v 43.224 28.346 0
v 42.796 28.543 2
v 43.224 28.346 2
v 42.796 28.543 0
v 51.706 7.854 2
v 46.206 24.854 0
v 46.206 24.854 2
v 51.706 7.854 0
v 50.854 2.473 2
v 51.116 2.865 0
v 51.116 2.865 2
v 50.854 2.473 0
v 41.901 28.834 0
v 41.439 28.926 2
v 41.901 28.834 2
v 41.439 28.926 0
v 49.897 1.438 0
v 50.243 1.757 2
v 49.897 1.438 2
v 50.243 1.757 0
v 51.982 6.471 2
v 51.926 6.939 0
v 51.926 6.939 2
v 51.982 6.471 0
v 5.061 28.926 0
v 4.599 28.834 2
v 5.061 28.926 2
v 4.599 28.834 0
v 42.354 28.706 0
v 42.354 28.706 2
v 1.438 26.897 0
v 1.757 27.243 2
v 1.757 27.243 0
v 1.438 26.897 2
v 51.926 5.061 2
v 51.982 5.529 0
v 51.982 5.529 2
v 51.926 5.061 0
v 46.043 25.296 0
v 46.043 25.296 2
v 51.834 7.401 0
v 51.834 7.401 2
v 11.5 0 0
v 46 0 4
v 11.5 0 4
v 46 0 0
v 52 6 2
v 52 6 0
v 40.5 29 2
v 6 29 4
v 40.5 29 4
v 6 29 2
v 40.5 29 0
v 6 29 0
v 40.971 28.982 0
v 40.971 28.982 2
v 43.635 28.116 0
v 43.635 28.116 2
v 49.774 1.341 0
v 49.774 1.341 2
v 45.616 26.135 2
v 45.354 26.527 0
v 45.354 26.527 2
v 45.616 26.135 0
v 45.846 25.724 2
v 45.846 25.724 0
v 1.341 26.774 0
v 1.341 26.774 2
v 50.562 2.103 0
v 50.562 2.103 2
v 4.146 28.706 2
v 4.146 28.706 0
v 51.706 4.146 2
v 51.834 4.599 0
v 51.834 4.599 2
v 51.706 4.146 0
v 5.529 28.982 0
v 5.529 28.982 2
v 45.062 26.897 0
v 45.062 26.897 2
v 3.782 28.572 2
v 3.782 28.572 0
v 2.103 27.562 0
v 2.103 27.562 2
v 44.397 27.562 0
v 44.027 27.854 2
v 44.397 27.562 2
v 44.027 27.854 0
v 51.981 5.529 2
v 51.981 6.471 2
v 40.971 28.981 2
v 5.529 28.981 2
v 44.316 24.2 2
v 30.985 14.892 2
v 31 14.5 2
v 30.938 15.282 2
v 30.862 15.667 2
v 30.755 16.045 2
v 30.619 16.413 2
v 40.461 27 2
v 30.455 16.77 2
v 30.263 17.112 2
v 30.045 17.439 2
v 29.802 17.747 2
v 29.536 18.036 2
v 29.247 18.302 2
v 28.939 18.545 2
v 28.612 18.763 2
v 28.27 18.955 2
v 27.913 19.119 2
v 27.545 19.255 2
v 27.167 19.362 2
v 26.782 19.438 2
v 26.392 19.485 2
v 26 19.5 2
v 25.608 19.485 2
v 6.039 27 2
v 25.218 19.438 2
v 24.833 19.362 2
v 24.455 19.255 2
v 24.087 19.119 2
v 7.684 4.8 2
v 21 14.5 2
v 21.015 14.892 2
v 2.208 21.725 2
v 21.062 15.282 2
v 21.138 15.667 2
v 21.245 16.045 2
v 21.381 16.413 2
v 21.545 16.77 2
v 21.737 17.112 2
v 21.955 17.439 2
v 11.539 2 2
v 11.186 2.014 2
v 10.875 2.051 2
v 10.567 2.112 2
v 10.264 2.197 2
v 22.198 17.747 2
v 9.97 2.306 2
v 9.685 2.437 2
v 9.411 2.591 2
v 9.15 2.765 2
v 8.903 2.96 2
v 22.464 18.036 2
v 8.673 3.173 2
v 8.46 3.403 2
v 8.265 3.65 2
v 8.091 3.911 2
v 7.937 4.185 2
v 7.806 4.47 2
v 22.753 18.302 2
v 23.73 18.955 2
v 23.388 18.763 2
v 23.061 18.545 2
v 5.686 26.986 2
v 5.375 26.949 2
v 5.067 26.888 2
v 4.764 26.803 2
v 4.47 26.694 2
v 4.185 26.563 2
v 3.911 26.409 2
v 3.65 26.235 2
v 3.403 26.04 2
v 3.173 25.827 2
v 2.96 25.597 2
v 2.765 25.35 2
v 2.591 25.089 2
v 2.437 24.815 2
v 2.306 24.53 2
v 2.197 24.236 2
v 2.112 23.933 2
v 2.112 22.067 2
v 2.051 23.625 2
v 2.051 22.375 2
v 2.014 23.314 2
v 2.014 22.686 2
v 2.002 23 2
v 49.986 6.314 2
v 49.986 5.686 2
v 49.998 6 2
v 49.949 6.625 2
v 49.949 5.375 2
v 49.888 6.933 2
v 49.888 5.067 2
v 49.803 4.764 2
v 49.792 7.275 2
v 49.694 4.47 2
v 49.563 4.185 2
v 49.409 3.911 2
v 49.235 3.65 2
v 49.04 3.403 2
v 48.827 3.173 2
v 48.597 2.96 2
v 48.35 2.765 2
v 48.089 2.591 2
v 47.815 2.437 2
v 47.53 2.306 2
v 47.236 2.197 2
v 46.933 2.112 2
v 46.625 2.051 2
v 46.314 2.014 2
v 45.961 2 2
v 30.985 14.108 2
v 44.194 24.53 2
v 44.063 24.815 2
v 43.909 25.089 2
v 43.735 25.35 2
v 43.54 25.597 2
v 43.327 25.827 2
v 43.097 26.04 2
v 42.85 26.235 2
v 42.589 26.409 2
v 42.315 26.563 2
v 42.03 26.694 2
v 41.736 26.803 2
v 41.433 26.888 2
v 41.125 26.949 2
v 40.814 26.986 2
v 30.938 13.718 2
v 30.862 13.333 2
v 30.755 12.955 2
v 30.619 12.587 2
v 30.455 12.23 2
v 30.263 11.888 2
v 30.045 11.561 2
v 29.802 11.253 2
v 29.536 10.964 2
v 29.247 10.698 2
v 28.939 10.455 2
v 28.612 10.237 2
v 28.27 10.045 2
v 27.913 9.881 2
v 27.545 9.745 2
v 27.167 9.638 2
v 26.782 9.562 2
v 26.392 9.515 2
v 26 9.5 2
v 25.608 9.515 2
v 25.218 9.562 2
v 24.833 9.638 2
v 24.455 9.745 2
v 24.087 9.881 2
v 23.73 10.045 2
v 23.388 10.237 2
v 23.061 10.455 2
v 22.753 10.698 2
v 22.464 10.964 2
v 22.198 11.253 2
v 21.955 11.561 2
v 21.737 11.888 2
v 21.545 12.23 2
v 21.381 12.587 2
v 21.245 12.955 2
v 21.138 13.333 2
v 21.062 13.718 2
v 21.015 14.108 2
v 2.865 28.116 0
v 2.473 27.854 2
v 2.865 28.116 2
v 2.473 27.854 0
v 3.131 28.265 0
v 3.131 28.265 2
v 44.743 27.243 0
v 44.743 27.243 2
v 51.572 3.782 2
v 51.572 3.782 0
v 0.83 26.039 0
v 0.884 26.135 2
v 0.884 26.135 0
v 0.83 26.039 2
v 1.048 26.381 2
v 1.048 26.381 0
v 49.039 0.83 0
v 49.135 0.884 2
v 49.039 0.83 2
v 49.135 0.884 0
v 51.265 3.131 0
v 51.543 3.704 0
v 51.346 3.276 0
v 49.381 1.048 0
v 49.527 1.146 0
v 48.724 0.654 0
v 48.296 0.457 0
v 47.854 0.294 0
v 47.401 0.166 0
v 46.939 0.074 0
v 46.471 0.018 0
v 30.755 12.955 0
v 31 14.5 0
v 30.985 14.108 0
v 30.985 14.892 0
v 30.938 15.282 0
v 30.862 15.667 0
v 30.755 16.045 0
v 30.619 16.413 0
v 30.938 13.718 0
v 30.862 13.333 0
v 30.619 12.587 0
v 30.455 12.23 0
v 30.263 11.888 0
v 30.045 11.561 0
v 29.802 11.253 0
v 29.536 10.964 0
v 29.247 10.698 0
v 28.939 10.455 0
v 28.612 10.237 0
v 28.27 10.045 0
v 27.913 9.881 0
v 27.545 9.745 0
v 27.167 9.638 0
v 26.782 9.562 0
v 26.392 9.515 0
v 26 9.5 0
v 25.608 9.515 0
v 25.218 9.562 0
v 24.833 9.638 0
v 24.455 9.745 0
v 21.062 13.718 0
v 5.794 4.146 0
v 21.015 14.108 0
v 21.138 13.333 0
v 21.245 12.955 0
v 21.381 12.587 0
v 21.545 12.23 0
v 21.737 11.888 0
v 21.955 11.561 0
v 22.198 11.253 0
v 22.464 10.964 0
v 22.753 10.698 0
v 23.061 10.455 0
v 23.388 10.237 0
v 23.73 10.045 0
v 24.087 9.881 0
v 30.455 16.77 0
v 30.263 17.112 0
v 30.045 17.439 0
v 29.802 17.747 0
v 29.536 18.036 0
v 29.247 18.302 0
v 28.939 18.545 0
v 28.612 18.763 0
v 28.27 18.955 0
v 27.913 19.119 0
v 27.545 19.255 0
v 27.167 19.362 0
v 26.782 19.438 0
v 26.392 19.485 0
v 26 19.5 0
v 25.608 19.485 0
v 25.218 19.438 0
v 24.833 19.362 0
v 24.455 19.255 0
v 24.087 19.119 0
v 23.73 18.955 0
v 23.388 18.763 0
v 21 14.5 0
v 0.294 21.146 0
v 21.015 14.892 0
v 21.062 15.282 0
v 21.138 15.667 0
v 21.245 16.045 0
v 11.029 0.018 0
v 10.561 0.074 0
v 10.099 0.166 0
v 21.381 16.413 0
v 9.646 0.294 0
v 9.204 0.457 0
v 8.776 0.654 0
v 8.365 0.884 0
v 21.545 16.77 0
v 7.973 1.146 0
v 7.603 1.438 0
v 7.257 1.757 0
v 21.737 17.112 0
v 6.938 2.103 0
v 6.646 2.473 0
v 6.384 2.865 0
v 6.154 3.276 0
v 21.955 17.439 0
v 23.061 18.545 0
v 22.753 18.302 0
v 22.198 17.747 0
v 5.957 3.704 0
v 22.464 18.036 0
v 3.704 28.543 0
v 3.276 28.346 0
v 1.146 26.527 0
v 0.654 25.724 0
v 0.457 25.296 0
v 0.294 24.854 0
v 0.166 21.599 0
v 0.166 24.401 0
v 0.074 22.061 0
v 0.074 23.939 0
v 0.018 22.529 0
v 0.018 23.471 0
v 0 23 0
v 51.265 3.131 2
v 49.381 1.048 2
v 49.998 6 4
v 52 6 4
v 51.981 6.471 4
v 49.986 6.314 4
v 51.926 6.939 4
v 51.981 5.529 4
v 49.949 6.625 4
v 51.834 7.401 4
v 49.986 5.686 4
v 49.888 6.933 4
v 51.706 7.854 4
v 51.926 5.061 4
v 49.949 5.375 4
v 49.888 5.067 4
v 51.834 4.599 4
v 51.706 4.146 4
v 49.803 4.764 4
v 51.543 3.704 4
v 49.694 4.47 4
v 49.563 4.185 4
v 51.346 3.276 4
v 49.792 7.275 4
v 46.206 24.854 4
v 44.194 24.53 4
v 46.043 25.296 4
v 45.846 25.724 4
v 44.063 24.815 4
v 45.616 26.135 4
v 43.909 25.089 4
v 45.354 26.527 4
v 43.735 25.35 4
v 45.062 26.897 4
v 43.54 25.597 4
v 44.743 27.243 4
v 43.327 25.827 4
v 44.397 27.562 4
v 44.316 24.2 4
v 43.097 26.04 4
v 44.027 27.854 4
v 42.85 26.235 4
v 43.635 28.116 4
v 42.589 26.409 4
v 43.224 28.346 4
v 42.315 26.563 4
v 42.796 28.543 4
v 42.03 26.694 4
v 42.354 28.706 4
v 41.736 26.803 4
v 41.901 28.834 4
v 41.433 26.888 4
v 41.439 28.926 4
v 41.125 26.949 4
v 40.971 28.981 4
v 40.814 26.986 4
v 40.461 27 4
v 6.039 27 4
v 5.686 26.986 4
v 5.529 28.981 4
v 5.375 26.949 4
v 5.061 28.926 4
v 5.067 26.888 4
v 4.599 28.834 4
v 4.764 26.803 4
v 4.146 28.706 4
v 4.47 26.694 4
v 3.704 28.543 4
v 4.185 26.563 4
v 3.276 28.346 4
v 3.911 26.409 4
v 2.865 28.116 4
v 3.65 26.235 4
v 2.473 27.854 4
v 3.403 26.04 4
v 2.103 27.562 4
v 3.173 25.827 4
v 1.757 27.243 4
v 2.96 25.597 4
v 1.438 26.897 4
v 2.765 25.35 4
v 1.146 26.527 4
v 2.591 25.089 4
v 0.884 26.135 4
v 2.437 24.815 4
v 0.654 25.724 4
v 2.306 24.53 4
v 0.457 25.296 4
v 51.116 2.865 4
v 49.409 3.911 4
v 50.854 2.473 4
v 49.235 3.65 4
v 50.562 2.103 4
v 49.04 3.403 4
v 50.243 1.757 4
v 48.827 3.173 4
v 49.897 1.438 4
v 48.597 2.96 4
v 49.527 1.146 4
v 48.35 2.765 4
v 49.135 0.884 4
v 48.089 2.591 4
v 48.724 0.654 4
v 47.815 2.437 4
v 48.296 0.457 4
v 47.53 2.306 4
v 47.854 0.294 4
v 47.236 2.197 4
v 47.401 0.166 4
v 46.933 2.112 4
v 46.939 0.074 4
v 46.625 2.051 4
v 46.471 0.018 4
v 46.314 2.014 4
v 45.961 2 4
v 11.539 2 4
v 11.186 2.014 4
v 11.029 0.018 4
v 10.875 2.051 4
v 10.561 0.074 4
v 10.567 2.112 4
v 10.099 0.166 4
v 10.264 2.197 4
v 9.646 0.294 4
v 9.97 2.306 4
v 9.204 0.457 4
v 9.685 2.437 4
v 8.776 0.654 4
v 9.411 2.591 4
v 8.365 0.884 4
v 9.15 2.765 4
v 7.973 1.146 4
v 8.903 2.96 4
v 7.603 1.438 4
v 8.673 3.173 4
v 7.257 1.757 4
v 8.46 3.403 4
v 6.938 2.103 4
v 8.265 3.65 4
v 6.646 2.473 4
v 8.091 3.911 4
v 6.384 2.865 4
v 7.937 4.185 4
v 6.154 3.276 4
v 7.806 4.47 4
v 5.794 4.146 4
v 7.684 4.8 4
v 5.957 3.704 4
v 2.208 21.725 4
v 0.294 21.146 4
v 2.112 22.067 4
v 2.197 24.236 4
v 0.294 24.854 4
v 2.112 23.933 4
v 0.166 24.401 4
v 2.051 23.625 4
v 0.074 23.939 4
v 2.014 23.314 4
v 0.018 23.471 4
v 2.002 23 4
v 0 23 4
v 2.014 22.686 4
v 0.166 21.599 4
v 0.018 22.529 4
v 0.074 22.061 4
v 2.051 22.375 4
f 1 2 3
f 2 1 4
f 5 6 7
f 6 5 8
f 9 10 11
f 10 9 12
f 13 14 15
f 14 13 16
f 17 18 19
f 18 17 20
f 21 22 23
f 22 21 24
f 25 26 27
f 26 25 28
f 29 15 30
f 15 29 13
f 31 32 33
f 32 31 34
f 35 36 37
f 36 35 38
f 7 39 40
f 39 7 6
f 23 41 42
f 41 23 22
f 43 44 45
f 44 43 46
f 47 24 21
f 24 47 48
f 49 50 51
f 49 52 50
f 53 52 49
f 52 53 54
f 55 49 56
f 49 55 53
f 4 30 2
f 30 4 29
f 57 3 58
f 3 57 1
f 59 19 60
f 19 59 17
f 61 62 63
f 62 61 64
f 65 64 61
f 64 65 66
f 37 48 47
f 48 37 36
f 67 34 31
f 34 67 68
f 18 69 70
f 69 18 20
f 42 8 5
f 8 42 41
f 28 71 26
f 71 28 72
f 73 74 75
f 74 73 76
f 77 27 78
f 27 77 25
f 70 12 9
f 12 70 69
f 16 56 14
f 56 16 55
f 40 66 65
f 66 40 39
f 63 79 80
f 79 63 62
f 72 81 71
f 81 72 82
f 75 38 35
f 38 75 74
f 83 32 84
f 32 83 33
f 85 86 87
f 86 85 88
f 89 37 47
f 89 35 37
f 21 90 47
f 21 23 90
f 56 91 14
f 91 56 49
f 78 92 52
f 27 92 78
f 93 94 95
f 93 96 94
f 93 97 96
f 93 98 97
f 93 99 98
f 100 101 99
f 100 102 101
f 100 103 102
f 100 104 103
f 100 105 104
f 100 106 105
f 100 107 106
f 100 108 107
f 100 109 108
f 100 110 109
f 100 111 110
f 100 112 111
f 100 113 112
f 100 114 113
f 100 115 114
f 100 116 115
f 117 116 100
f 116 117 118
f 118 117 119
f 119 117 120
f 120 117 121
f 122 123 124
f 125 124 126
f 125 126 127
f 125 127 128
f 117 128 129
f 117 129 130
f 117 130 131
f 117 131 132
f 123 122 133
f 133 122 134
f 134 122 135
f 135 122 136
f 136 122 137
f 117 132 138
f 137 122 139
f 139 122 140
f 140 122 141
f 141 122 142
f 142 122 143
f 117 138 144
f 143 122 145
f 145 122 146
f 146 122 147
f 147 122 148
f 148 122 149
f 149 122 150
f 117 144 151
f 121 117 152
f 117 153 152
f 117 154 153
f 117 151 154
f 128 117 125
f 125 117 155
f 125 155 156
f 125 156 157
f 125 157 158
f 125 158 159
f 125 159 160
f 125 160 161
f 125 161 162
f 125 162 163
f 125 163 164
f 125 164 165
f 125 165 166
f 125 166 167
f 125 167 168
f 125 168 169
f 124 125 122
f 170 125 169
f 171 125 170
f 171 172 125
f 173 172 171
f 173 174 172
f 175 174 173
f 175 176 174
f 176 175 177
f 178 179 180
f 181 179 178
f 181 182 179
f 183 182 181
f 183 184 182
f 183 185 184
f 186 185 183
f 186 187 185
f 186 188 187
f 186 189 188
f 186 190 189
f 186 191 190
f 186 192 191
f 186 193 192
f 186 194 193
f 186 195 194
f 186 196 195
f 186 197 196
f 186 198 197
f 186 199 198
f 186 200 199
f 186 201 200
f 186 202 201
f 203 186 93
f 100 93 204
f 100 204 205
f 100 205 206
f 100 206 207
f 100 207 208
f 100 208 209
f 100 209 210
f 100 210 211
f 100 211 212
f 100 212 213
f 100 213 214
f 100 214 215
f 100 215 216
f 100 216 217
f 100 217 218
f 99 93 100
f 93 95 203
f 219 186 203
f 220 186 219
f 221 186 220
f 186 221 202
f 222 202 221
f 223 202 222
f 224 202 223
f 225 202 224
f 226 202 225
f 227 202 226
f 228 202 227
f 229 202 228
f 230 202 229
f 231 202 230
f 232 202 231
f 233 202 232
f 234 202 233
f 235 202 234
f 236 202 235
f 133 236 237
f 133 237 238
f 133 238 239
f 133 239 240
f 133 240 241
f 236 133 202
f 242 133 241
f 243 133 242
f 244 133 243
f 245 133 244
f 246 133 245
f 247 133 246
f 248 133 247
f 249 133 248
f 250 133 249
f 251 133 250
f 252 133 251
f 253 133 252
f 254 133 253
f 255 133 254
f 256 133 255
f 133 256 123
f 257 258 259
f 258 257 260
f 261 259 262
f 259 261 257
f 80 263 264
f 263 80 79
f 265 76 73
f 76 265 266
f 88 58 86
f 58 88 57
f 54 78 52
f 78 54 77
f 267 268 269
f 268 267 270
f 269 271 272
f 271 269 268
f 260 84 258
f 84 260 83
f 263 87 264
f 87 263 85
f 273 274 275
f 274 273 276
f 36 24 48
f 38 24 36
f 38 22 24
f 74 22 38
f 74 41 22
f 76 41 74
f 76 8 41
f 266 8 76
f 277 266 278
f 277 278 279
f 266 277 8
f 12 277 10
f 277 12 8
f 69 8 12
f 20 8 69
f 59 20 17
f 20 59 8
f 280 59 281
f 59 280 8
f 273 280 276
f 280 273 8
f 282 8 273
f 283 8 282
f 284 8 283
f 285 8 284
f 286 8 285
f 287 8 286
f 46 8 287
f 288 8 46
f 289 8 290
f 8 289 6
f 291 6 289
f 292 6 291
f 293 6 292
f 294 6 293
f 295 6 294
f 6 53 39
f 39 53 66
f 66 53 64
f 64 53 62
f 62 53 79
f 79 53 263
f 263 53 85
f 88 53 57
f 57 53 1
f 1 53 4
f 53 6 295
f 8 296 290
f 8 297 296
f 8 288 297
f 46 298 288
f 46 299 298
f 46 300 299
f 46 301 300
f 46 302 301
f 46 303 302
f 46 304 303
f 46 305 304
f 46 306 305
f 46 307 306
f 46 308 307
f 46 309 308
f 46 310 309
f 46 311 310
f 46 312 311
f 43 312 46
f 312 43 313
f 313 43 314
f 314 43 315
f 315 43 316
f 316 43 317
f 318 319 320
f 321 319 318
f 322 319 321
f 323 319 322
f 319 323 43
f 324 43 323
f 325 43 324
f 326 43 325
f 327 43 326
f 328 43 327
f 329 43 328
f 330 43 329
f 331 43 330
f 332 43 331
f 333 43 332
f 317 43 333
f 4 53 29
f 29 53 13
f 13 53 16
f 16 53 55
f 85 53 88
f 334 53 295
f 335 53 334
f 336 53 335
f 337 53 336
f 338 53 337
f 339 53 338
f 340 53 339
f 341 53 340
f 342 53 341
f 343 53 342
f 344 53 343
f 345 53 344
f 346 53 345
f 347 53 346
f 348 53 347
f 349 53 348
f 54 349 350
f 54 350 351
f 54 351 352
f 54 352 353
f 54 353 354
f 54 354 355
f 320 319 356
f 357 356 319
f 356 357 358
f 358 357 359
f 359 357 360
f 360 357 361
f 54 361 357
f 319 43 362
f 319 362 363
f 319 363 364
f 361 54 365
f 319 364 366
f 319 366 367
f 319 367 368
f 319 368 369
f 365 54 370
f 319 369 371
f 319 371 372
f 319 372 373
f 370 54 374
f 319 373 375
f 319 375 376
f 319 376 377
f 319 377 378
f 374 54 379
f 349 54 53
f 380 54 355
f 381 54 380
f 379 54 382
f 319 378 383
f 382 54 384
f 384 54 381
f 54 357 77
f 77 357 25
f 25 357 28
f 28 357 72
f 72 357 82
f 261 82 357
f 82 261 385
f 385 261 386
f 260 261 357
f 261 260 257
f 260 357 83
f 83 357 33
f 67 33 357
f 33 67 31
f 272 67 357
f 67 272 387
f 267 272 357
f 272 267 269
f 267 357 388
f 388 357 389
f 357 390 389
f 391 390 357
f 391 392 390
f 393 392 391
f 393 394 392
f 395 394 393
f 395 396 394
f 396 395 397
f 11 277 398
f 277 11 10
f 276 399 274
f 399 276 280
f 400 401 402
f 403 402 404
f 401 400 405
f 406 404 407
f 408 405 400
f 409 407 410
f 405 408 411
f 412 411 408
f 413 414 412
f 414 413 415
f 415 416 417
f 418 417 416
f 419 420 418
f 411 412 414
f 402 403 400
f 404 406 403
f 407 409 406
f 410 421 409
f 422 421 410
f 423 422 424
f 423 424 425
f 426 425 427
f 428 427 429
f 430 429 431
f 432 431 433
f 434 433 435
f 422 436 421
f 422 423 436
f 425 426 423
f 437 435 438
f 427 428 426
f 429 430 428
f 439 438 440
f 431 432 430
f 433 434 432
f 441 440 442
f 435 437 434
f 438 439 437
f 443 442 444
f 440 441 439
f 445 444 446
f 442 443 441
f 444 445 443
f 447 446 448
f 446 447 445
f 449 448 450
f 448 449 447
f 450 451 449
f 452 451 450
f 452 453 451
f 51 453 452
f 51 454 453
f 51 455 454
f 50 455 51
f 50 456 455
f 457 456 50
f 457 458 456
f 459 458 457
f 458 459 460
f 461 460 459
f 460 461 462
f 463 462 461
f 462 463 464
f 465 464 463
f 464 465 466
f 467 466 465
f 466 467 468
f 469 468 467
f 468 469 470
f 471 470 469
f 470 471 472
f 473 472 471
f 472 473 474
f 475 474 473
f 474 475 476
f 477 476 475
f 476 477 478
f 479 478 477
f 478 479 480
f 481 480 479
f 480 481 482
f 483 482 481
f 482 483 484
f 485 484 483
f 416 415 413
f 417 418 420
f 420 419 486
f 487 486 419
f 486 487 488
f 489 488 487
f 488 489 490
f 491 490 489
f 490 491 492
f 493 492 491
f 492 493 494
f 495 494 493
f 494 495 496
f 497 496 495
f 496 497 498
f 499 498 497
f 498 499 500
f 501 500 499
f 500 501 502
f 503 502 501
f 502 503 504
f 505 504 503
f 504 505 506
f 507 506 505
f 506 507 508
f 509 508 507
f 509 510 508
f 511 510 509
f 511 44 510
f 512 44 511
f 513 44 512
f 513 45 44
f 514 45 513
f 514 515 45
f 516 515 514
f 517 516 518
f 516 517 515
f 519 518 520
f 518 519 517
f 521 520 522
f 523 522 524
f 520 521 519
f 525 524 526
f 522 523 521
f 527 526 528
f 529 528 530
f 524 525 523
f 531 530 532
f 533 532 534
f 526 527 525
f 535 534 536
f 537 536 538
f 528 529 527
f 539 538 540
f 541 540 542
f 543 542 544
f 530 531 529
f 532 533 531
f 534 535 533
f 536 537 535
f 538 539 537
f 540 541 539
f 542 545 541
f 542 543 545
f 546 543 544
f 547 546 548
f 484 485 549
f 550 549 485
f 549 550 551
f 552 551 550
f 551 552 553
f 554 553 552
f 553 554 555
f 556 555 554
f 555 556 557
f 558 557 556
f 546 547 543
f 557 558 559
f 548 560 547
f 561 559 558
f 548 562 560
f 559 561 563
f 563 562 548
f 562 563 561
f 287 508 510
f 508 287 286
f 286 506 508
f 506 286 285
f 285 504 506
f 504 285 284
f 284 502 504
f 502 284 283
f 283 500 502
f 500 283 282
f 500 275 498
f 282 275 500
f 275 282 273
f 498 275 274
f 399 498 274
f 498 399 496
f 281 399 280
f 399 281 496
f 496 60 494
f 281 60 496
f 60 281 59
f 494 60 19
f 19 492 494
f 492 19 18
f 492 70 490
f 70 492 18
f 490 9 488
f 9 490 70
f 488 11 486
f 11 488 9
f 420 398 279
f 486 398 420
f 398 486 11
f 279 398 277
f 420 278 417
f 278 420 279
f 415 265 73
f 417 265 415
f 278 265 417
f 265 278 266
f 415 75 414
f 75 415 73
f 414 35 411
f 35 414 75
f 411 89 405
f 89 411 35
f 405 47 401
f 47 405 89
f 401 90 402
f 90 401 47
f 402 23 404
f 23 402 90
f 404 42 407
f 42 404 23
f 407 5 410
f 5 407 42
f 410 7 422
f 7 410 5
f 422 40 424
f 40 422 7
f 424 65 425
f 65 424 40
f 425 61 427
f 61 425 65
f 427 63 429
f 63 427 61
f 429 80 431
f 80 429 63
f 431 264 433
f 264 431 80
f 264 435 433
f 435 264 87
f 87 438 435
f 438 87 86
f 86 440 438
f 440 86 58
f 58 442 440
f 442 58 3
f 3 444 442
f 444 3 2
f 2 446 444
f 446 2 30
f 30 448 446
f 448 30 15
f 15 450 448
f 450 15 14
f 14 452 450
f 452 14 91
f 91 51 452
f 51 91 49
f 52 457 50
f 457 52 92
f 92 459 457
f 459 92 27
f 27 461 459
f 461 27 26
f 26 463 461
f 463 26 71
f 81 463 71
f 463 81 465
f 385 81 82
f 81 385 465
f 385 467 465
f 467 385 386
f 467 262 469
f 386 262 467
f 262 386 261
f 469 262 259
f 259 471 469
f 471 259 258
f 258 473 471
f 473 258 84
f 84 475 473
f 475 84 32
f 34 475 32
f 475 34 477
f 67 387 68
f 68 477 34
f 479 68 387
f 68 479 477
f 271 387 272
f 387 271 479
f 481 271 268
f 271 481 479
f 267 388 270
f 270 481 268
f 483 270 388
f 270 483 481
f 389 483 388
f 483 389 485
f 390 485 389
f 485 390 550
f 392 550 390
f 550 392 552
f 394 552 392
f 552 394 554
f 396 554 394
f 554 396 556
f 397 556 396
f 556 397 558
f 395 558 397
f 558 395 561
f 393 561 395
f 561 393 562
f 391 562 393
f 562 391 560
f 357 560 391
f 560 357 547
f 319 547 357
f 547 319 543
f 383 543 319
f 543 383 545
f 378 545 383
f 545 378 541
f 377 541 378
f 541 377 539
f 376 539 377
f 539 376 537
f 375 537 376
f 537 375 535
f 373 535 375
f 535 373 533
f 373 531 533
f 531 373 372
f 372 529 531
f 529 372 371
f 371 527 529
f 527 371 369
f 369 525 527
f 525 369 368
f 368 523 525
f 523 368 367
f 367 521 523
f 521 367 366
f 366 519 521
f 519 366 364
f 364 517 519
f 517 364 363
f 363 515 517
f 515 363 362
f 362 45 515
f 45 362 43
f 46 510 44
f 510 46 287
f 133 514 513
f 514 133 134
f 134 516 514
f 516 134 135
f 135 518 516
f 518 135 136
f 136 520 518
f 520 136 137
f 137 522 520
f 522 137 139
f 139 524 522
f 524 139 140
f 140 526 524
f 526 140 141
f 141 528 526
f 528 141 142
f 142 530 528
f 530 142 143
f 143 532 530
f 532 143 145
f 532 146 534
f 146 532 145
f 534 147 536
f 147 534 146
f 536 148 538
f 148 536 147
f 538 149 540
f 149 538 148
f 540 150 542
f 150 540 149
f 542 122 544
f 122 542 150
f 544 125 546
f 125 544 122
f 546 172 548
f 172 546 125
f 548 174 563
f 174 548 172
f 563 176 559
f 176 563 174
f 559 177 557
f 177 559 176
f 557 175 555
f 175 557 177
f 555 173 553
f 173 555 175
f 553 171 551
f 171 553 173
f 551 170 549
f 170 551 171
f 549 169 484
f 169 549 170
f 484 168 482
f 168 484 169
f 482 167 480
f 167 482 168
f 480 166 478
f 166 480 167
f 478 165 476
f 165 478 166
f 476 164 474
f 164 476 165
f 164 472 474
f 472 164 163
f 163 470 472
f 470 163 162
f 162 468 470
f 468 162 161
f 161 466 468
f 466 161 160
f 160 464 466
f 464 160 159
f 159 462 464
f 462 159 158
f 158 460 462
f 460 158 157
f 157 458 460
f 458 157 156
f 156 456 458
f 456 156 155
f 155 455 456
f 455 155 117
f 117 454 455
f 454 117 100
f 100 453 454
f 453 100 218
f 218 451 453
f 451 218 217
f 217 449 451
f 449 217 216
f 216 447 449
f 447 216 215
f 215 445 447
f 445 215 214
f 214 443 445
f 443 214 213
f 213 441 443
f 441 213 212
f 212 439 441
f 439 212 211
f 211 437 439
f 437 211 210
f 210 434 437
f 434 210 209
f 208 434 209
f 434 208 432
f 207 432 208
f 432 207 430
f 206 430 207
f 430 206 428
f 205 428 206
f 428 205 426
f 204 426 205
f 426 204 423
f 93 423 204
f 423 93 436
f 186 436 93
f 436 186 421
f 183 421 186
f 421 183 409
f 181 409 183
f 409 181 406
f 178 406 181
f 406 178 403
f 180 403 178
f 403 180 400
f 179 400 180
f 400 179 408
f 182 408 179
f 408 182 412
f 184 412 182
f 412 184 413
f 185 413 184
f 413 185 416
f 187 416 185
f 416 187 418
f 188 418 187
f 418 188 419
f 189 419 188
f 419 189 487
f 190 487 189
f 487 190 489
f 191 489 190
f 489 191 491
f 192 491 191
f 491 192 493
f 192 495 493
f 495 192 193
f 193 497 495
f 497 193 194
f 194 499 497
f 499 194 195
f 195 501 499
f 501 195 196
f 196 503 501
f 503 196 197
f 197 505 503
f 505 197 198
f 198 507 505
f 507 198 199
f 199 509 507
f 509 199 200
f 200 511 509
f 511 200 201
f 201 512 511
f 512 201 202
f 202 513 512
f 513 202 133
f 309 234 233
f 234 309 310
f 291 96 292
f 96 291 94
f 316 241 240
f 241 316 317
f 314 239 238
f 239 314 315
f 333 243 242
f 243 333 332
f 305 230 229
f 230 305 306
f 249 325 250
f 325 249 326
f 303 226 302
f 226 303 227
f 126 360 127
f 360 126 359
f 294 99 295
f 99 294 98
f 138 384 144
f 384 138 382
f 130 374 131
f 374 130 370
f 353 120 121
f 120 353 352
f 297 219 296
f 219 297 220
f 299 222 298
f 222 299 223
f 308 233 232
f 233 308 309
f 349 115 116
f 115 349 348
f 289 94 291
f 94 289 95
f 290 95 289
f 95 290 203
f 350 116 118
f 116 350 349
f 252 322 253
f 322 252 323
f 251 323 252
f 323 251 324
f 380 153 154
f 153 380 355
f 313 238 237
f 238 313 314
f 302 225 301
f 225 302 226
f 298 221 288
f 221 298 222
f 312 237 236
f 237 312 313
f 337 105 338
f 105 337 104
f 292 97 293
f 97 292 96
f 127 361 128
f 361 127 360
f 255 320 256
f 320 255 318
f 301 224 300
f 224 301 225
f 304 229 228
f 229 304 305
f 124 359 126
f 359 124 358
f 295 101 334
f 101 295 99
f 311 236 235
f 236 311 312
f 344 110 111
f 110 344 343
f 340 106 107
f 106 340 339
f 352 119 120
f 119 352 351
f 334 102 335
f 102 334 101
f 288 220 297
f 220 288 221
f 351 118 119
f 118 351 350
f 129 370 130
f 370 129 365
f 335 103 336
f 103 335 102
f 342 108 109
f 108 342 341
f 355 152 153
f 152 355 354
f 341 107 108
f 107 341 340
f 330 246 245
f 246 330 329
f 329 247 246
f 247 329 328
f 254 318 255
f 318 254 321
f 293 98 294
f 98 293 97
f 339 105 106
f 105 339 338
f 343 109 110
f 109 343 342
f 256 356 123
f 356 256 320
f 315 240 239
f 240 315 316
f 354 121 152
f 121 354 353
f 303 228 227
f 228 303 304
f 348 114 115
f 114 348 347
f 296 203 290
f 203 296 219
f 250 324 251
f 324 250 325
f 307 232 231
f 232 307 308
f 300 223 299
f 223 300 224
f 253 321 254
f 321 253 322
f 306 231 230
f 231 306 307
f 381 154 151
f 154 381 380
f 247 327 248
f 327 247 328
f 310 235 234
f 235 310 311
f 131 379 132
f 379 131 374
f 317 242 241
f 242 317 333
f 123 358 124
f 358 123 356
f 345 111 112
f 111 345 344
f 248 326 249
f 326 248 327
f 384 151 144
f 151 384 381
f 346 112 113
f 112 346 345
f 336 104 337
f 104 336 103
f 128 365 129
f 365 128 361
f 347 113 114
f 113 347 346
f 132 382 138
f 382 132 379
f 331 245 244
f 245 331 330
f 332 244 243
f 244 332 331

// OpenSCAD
$fn = 80; 

// Part Dimensions (in millimeters)
//max_length = 45;
max_length = 52;
max_width = 29;
rim_height = 4;
center_height = 2;
rim_wall_thickness = 2;
corner_radius = 6; 

// Center hole diameter (1 cm = 10 mm)
screw_diameter = 10; 

module base_silhouette() {
    hull() {
        // Bottom Left
        translate([corner_radius + 5.5, corner_radius, 0]) circle(r = corner_radius);
        // Bottom Right
        translate([max_length - corner_radius, corner_radius, 0]) circle(r = corner_radius);
        // Top Left
        translate([corner_radius, max_width - corner_radius, 0]) circle(r = corner_radius);
        // Top Right
        translate([max_length - corner_radius - 5.5, max_width - corner_radius, 0]) circle(r = corner_radius);
    }
} 

difference() {
    union() {
        // 1. Flat center area (2mm thickness)
        linear_extrude(height = center_height) {
            base_silhouette();
        } 

        // 2. Raised outer rim (4mm total height)
        linear_extrude(height = rim_height) {
            difference() {
                base_silhouette();
                offset(r = -rim_wall_thickness) {
                    base_silhouette();
                }
            }
        }
    }

    // 3. Center screw hole perforation (10mm diameter)
    translate([max_length / 2, max_width / 2, -1]) {
        cylinder(h = rim_height + 2, d = screw_diameter);
    }
}
